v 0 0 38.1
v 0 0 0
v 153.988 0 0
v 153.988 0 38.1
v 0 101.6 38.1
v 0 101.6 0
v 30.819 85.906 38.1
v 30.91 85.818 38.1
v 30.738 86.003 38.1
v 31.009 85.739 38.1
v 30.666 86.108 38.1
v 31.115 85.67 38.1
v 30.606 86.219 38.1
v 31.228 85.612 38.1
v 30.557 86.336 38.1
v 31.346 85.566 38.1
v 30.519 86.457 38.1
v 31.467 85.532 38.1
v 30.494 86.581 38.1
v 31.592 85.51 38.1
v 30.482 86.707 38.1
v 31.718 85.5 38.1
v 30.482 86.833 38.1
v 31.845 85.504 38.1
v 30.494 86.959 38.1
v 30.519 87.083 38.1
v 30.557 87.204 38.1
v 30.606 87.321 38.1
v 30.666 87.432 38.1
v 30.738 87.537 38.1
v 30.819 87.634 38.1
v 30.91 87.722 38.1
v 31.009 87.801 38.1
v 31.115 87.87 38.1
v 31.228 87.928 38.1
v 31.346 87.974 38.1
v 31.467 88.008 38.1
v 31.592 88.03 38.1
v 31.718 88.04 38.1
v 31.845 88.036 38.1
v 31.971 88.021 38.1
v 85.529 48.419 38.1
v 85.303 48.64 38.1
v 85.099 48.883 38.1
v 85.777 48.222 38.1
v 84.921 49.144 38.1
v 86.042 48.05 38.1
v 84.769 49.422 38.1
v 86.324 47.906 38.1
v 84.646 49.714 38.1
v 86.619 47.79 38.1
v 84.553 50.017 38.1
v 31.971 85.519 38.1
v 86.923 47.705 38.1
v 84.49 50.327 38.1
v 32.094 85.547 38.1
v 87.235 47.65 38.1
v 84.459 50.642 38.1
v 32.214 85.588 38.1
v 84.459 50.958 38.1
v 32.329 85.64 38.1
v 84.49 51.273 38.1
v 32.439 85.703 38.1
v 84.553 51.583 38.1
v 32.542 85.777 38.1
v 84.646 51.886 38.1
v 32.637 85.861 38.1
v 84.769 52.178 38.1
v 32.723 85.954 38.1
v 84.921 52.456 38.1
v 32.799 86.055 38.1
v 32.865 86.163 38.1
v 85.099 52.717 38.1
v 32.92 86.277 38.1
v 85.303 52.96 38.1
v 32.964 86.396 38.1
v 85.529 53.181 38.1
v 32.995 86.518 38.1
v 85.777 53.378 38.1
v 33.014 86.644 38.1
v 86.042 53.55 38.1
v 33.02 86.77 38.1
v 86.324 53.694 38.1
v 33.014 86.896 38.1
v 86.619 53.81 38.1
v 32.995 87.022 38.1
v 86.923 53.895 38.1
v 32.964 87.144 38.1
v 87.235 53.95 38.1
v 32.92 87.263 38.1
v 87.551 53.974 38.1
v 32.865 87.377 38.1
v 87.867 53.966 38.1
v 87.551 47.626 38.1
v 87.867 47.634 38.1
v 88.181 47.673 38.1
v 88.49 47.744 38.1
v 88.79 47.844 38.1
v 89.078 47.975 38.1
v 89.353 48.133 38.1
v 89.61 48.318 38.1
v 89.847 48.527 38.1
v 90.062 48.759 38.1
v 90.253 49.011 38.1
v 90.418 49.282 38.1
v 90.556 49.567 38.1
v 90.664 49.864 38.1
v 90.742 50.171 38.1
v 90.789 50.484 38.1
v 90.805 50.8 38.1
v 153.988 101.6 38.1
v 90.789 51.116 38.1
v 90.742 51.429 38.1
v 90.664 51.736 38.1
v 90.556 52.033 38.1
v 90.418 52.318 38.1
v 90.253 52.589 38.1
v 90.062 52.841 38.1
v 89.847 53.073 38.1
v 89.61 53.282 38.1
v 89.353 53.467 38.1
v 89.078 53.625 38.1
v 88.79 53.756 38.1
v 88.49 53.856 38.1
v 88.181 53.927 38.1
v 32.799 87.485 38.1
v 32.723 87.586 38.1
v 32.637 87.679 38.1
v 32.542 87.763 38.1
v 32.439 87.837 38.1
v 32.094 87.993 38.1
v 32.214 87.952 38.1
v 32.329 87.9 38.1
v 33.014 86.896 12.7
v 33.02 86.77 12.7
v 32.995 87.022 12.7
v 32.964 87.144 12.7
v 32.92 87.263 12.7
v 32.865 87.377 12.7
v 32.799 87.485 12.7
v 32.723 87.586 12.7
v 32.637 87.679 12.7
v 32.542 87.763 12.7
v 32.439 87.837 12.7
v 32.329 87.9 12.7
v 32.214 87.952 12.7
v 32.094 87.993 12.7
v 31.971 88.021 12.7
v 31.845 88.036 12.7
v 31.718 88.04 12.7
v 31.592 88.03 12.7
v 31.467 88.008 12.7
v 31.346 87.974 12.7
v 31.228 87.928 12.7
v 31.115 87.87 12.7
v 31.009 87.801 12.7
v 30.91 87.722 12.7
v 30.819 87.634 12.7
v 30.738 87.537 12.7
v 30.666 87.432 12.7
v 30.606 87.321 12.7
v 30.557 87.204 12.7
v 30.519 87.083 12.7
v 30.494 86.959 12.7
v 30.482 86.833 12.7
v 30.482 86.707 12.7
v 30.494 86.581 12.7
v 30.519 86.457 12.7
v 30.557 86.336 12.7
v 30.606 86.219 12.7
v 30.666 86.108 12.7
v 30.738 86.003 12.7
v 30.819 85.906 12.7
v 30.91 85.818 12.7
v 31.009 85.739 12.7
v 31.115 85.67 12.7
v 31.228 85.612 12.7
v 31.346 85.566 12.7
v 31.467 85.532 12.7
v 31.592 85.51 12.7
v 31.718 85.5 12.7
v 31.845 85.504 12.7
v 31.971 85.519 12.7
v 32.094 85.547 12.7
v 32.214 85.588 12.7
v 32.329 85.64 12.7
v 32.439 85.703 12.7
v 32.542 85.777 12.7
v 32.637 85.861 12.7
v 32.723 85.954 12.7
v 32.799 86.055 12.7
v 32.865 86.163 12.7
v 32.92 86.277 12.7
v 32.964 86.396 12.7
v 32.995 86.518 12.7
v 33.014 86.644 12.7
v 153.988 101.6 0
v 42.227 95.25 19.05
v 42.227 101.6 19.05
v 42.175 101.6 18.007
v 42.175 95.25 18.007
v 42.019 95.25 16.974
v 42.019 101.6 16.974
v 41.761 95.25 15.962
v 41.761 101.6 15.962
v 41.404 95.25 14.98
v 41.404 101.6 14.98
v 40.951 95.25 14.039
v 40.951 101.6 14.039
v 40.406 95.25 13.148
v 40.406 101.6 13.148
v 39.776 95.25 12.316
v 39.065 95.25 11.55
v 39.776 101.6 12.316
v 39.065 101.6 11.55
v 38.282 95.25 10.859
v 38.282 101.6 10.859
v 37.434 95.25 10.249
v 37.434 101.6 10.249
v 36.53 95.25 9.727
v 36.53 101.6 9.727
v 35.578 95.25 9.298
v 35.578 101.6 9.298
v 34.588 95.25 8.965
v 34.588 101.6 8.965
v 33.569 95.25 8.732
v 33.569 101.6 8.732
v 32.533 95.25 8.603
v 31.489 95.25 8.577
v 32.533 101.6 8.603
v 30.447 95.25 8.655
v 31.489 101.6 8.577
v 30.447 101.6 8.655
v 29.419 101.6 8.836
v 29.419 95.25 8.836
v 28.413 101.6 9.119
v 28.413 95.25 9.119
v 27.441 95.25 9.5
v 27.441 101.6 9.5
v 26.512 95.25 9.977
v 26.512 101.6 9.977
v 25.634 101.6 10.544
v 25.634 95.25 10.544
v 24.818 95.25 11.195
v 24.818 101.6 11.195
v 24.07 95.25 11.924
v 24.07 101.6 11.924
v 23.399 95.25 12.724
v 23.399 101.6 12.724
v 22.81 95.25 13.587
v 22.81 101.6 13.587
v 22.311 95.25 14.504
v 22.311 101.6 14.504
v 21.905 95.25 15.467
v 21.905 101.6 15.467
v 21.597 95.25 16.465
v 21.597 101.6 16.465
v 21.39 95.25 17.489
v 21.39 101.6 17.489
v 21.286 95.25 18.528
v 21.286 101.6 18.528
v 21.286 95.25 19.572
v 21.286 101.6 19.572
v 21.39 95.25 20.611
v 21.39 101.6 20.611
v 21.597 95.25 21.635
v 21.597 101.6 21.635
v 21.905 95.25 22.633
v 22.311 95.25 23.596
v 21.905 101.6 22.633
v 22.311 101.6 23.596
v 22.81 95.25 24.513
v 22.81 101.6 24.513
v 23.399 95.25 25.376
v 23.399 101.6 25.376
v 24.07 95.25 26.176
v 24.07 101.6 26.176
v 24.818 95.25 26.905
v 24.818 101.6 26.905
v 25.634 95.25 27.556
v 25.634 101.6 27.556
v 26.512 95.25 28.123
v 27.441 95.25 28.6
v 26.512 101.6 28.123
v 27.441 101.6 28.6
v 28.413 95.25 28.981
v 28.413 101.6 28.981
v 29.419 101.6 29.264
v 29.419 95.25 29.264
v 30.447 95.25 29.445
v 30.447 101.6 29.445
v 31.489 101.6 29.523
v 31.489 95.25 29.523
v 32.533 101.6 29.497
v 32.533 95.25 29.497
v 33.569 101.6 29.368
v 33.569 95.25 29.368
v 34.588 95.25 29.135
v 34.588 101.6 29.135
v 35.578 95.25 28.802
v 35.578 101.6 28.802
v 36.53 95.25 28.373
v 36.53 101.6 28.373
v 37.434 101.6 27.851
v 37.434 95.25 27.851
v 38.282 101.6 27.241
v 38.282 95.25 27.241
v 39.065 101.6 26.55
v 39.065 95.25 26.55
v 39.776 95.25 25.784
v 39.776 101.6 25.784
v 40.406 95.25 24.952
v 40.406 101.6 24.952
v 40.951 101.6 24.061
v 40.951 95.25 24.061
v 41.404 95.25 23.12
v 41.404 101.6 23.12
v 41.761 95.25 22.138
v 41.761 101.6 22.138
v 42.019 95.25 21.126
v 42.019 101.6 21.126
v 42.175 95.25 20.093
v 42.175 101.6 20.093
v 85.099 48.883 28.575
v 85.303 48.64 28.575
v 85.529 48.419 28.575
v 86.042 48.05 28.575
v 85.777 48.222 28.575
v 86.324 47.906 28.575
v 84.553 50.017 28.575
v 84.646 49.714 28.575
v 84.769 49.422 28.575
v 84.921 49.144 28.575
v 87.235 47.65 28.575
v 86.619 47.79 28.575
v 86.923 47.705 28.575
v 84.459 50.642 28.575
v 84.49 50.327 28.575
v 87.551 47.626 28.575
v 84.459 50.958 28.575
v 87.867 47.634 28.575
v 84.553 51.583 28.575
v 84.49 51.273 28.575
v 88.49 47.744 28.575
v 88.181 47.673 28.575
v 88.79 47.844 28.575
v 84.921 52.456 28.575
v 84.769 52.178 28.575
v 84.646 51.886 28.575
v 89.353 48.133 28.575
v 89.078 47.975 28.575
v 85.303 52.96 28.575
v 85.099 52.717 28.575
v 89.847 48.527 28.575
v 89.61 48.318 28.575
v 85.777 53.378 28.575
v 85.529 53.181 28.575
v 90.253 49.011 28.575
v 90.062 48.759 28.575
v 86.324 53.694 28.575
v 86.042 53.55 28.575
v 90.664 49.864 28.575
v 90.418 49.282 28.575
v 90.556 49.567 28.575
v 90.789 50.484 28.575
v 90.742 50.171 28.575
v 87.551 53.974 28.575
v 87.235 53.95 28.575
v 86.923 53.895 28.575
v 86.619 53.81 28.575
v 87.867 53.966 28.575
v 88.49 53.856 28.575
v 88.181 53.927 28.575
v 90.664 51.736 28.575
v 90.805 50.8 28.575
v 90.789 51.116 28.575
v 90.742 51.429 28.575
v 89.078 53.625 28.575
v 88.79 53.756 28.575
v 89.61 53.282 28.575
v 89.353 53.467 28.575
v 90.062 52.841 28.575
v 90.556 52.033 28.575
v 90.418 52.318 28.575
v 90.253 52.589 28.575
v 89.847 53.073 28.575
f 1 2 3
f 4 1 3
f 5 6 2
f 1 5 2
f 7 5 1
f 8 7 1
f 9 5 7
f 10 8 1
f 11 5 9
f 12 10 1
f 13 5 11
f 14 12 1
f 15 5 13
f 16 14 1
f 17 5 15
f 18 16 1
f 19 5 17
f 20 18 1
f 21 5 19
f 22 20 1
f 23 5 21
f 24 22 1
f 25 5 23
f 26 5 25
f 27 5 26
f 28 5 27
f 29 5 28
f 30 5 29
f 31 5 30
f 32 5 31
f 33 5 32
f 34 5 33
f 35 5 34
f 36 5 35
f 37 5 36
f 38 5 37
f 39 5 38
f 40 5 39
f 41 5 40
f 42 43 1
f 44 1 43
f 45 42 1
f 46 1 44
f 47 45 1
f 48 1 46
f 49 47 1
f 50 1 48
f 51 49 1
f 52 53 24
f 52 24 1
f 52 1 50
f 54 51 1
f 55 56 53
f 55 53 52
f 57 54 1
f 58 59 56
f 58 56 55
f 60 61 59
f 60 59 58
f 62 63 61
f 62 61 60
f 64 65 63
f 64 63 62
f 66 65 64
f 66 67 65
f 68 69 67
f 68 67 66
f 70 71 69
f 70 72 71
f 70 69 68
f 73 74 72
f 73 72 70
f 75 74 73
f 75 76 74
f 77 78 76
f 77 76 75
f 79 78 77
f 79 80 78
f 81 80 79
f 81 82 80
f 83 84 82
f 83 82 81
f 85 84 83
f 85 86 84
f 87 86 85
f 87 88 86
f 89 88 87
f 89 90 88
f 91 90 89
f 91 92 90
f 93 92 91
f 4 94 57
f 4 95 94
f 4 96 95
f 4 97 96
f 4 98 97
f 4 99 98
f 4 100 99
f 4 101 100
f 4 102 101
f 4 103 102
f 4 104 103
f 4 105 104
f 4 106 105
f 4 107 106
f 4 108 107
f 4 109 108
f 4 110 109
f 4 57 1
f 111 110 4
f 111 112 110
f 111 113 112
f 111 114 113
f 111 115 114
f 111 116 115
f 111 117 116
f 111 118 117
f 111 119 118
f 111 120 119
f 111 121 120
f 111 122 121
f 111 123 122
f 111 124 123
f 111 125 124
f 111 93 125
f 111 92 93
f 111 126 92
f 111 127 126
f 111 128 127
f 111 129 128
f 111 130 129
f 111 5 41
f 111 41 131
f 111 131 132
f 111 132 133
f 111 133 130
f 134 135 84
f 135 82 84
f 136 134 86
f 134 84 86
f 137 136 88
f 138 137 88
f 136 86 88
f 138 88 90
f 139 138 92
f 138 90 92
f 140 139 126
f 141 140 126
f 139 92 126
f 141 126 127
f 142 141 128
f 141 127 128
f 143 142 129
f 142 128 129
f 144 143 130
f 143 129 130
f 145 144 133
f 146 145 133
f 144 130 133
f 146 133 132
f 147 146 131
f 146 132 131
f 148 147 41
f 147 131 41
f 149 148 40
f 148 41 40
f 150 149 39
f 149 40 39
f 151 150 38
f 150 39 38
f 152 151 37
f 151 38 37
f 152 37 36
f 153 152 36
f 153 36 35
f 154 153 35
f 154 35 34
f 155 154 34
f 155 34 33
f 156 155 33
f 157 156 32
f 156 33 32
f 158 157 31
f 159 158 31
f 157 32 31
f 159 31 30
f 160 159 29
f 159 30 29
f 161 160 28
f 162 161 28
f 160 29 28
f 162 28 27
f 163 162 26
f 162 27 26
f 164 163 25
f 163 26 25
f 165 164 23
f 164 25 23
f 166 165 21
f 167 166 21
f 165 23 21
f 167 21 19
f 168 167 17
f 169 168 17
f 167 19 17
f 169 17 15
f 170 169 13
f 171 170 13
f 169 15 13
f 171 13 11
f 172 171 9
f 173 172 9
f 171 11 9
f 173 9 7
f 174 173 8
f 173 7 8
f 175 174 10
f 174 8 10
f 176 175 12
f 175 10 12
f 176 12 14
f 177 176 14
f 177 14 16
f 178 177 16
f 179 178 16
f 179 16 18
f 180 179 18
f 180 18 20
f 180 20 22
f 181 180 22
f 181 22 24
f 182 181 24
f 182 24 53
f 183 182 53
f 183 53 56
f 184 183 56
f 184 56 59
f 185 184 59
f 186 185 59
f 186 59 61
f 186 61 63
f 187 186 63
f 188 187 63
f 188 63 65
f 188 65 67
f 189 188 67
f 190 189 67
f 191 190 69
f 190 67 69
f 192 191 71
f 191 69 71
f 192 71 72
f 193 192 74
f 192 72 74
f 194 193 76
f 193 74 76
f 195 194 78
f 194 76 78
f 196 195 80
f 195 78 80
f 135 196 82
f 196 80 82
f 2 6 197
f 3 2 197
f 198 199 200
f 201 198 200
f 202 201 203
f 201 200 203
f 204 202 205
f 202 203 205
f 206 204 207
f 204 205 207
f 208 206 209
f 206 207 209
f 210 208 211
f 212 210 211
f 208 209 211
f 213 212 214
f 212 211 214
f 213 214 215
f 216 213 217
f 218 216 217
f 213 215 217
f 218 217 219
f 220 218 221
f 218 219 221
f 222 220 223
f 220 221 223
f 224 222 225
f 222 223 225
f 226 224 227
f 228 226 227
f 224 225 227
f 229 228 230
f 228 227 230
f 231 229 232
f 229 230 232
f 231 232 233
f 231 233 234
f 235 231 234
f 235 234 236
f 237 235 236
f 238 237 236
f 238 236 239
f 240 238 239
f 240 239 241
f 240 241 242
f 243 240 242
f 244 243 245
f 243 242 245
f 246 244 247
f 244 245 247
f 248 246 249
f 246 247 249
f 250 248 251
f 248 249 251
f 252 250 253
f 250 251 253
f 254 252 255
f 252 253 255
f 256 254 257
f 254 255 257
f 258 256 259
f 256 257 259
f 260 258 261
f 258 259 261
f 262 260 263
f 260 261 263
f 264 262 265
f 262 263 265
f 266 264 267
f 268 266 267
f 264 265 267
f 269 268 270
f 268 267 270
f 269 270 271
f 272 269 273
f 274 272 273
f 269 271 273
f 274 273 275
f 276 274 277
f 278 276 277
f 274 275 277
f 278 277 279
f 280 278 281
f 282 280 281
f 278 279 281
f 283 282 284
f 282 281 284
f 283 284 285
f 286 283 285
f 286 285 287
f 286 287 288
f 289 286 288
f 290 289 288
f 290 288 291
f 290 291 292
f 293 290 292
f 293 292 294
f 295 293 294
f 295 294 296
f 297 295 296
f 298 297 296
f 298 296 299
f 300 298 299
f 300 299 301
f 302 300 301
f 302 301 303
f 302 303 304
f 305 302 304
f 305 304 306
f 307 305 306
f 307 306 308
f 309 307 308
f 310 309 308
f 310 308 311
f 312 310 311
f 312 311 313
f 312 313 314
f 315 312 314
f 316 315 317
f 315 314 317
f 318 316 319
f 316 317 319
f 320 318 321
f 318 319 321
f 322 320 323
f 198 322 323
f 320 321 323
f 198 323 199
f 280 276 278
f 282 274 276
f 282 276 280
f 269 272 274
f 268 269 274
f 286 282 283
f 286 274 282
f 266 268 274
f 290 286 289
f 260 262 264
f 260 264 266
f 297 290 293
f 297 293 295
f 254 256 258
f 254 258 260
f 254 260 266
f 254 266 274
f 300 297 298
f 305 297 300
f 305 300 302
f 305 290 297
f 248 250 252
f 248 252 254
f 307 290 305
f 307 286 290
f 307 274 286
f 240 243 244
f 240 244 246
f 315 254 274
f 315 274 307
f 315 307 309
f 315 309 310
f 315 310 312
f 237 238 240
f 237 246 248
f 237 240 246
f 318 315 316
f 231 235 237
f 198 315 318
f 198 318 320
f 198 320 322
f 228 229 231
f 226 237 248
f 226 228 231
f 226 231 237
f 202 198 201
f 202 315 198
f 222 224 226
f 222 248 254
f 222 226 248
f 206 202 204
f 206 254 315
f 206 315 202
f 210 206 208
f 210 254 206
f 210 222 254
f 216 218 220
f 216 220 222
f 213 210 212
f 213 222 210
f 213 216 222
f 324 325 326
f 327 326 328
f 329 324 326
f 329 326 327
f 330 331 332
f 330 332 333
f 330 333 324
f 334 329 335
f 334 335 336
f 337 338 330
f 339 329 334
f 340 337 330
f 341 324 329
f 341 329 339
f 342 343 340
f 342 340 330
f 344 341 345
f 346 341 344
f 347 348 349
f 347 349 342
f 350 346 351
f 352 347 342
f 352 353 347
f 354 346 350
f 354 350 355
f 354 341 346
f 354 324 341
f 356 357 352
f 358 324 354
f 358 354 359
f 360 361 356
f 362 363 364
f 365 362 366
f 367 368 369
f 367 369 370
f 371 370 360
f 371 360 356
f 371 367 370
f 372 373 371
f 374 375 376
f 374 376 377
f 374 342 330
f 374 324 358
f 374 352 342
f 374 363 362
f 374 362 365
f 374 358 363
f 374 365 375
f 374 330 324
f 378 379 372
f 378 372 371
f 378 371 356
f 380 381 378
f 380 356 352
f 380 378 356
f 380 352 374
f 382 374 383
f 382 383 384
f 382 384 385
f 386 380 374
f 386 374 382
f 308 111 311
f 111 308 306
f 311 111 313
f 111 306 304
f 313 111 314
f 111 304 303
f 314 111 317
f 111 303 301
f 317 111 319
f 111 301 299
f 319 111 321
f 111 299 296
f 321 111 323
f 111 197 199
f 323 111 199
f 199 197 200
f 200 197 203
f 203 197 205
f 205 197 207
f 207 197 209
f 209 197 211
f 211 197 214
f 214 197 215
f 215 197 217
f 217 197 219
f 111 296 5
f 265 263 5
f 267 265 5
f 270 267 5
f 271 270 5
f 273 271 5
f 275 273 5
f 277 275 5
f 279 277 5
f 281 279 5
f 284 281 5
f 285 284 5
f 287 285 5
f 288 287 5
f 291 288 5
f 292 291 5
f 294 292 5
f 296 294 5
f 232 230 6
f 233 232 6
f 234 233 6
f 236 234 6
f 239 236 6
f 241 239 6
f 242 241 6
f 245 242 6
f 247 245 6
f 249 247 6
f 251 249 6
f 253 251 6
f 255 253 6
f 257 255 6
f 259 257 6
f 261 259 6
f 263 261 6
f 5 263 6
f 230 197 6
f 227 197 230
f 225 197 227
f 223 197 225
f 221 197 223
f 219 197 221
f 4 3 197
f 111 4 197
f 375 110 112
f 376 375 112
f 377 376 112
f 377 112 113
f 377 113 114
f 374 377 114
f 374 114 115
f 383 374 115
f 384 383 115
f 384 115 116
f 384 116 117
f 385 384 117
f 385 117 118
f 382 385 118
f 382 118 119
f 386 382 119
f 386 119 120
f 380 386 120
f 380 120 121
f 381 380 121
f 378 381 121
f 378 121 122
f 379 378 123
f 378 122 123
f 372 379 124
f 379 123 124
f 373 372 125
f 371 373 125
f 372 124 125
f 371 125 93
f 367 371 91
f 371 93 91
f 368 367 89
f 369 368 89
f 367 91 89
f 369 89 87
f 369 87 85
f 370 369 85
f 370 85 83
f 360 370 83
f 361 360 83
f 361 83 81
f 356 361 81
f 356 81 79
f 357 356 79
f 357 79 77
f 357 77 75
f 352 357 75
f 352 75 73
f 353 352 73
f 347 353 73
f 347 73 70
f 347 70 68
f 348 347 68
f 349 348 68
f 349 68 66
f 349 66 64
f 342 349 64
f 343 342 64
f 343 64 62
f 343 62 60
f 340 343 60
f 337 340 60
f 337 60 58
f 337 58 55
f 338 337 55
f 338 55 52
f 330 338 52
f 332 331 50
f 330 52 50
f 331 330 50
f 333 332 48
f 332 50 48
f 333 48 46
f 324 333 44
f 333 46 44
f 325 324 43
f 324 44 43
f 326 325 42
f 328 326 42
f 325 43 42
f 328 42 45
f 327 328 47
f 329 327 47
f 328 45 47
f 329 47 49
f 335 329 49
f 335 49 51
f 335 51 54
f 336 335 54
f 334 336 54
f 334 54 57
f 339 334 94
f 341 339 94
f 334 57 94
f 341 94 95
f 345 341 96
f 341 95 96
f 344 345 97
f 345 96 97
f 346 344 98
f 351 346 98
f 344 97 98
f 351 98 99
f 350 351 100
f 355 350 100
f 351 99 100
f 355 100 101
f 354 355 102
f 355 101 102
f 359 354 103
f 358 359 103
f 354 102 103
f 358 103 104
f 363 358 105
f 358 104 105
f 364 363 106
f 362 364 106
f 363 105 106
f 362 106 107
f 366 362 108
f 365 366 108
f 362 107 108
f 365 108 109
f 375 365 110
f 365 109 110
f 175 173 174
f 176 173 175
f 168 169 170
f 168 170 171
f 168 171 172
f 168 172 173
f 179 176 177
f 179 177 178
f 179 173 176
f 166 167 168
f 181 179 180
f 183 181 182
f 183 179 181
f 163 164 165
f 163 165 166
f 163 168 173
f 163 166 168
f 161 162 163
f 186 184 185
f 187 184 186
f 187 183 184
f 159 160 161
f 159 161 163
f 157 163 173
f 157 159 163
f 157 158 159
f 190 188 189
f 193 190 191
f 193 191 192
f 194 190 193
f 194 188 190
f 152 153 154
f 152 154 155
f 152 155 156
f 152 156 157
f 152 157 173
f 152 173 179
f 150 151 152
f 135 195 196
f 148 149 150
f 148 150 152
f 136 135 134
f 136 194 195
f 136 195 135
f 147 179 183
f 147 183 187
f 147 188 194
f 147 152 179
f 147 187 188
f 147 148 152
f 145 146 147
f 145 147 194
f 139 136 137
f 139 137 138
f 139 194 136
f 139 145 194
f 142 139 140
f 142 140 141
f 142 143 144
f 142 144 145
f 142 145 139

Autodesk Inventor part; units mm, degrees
ref_plane "YZ Plane" through (0, 0, 0) normal (1, 0, 0) x (0, 1, 0)
ref_plane "XZ Plane" through (0, 0, 0) normal (0, 1, 0) x (-1, 0, 0)
ref_plane "XY Plane" through (0, 0, 0) normal (0, 0, 1) x (1, 0, 0)
sketch "Sketch1" plane through (0, 0, 0) normal (0, 0, 1) x (1, 0, 0)
  line L0 (0, 0) -> (153.9875, 0)
  line L1 (153.9875, 0) -> (153.9875, 101.6)
  line L2 (153.9875, 101.6) -> (0, 101.6)
  line L3 (0, 101.6) -> (0, 0)
  dimension "d0" = 153.9875
  dimension "d1" = 101.6
extrude "Extrusion1" add sketch "Sketch1" along normal blind 38.1
sketch "Sketch2" plane through (0, 101.6, 0) normal (0, 1, 0) x (1, 0, 0)
  line L0 (0, -38.1) -> (153.9875, -38.1) projected
  line L1 (0, 0) -> (0, -38.1) projected
  circle A0 centre (31.75, -19.05) radius 10.4767
  dimension "d4" = 31.75
  dimension "d5" = 19.05
extrude "Extrusion2" cut sketch "Sketch2" against normal blind 6.35
sketch "Sketch3" plane through (0, 0, 38.1) normal (0, 0, 1) x (1, 0, 0)
  line L0 (0, 0) -> (0, 101.6) projected
  line L1 (0, 101.6) -> (153.9875, 101.6) projected
  circle A0 centre (87.63, 50.8) radius 3.175
  dimension "d8" = 6.35
  dimension "d9" = 87.63
  dimension "d10" = 50.8
extrude "Extrusion3" cut sketch "Sketch3" against normal blind 9.525
sketch "Sketch4" plane through (0, 0, 38.1) normal (0, 0, 1) x (1, 0, 0)
  line L0 (42.2267, 95.25) -> (21.2733, 95.25) projected
  line L1 (31.75, 95.25) -> (31.75, 50.8) construction
  circle A0 centre (31.75, 86.77) radius 1.27
  dimension "d13" = 2.54
extrude "Extrusion4" cut sketch "Sketch4" against normal blind 25.4
properties part number "aaxaProjector01" material "ABS Plastic"
